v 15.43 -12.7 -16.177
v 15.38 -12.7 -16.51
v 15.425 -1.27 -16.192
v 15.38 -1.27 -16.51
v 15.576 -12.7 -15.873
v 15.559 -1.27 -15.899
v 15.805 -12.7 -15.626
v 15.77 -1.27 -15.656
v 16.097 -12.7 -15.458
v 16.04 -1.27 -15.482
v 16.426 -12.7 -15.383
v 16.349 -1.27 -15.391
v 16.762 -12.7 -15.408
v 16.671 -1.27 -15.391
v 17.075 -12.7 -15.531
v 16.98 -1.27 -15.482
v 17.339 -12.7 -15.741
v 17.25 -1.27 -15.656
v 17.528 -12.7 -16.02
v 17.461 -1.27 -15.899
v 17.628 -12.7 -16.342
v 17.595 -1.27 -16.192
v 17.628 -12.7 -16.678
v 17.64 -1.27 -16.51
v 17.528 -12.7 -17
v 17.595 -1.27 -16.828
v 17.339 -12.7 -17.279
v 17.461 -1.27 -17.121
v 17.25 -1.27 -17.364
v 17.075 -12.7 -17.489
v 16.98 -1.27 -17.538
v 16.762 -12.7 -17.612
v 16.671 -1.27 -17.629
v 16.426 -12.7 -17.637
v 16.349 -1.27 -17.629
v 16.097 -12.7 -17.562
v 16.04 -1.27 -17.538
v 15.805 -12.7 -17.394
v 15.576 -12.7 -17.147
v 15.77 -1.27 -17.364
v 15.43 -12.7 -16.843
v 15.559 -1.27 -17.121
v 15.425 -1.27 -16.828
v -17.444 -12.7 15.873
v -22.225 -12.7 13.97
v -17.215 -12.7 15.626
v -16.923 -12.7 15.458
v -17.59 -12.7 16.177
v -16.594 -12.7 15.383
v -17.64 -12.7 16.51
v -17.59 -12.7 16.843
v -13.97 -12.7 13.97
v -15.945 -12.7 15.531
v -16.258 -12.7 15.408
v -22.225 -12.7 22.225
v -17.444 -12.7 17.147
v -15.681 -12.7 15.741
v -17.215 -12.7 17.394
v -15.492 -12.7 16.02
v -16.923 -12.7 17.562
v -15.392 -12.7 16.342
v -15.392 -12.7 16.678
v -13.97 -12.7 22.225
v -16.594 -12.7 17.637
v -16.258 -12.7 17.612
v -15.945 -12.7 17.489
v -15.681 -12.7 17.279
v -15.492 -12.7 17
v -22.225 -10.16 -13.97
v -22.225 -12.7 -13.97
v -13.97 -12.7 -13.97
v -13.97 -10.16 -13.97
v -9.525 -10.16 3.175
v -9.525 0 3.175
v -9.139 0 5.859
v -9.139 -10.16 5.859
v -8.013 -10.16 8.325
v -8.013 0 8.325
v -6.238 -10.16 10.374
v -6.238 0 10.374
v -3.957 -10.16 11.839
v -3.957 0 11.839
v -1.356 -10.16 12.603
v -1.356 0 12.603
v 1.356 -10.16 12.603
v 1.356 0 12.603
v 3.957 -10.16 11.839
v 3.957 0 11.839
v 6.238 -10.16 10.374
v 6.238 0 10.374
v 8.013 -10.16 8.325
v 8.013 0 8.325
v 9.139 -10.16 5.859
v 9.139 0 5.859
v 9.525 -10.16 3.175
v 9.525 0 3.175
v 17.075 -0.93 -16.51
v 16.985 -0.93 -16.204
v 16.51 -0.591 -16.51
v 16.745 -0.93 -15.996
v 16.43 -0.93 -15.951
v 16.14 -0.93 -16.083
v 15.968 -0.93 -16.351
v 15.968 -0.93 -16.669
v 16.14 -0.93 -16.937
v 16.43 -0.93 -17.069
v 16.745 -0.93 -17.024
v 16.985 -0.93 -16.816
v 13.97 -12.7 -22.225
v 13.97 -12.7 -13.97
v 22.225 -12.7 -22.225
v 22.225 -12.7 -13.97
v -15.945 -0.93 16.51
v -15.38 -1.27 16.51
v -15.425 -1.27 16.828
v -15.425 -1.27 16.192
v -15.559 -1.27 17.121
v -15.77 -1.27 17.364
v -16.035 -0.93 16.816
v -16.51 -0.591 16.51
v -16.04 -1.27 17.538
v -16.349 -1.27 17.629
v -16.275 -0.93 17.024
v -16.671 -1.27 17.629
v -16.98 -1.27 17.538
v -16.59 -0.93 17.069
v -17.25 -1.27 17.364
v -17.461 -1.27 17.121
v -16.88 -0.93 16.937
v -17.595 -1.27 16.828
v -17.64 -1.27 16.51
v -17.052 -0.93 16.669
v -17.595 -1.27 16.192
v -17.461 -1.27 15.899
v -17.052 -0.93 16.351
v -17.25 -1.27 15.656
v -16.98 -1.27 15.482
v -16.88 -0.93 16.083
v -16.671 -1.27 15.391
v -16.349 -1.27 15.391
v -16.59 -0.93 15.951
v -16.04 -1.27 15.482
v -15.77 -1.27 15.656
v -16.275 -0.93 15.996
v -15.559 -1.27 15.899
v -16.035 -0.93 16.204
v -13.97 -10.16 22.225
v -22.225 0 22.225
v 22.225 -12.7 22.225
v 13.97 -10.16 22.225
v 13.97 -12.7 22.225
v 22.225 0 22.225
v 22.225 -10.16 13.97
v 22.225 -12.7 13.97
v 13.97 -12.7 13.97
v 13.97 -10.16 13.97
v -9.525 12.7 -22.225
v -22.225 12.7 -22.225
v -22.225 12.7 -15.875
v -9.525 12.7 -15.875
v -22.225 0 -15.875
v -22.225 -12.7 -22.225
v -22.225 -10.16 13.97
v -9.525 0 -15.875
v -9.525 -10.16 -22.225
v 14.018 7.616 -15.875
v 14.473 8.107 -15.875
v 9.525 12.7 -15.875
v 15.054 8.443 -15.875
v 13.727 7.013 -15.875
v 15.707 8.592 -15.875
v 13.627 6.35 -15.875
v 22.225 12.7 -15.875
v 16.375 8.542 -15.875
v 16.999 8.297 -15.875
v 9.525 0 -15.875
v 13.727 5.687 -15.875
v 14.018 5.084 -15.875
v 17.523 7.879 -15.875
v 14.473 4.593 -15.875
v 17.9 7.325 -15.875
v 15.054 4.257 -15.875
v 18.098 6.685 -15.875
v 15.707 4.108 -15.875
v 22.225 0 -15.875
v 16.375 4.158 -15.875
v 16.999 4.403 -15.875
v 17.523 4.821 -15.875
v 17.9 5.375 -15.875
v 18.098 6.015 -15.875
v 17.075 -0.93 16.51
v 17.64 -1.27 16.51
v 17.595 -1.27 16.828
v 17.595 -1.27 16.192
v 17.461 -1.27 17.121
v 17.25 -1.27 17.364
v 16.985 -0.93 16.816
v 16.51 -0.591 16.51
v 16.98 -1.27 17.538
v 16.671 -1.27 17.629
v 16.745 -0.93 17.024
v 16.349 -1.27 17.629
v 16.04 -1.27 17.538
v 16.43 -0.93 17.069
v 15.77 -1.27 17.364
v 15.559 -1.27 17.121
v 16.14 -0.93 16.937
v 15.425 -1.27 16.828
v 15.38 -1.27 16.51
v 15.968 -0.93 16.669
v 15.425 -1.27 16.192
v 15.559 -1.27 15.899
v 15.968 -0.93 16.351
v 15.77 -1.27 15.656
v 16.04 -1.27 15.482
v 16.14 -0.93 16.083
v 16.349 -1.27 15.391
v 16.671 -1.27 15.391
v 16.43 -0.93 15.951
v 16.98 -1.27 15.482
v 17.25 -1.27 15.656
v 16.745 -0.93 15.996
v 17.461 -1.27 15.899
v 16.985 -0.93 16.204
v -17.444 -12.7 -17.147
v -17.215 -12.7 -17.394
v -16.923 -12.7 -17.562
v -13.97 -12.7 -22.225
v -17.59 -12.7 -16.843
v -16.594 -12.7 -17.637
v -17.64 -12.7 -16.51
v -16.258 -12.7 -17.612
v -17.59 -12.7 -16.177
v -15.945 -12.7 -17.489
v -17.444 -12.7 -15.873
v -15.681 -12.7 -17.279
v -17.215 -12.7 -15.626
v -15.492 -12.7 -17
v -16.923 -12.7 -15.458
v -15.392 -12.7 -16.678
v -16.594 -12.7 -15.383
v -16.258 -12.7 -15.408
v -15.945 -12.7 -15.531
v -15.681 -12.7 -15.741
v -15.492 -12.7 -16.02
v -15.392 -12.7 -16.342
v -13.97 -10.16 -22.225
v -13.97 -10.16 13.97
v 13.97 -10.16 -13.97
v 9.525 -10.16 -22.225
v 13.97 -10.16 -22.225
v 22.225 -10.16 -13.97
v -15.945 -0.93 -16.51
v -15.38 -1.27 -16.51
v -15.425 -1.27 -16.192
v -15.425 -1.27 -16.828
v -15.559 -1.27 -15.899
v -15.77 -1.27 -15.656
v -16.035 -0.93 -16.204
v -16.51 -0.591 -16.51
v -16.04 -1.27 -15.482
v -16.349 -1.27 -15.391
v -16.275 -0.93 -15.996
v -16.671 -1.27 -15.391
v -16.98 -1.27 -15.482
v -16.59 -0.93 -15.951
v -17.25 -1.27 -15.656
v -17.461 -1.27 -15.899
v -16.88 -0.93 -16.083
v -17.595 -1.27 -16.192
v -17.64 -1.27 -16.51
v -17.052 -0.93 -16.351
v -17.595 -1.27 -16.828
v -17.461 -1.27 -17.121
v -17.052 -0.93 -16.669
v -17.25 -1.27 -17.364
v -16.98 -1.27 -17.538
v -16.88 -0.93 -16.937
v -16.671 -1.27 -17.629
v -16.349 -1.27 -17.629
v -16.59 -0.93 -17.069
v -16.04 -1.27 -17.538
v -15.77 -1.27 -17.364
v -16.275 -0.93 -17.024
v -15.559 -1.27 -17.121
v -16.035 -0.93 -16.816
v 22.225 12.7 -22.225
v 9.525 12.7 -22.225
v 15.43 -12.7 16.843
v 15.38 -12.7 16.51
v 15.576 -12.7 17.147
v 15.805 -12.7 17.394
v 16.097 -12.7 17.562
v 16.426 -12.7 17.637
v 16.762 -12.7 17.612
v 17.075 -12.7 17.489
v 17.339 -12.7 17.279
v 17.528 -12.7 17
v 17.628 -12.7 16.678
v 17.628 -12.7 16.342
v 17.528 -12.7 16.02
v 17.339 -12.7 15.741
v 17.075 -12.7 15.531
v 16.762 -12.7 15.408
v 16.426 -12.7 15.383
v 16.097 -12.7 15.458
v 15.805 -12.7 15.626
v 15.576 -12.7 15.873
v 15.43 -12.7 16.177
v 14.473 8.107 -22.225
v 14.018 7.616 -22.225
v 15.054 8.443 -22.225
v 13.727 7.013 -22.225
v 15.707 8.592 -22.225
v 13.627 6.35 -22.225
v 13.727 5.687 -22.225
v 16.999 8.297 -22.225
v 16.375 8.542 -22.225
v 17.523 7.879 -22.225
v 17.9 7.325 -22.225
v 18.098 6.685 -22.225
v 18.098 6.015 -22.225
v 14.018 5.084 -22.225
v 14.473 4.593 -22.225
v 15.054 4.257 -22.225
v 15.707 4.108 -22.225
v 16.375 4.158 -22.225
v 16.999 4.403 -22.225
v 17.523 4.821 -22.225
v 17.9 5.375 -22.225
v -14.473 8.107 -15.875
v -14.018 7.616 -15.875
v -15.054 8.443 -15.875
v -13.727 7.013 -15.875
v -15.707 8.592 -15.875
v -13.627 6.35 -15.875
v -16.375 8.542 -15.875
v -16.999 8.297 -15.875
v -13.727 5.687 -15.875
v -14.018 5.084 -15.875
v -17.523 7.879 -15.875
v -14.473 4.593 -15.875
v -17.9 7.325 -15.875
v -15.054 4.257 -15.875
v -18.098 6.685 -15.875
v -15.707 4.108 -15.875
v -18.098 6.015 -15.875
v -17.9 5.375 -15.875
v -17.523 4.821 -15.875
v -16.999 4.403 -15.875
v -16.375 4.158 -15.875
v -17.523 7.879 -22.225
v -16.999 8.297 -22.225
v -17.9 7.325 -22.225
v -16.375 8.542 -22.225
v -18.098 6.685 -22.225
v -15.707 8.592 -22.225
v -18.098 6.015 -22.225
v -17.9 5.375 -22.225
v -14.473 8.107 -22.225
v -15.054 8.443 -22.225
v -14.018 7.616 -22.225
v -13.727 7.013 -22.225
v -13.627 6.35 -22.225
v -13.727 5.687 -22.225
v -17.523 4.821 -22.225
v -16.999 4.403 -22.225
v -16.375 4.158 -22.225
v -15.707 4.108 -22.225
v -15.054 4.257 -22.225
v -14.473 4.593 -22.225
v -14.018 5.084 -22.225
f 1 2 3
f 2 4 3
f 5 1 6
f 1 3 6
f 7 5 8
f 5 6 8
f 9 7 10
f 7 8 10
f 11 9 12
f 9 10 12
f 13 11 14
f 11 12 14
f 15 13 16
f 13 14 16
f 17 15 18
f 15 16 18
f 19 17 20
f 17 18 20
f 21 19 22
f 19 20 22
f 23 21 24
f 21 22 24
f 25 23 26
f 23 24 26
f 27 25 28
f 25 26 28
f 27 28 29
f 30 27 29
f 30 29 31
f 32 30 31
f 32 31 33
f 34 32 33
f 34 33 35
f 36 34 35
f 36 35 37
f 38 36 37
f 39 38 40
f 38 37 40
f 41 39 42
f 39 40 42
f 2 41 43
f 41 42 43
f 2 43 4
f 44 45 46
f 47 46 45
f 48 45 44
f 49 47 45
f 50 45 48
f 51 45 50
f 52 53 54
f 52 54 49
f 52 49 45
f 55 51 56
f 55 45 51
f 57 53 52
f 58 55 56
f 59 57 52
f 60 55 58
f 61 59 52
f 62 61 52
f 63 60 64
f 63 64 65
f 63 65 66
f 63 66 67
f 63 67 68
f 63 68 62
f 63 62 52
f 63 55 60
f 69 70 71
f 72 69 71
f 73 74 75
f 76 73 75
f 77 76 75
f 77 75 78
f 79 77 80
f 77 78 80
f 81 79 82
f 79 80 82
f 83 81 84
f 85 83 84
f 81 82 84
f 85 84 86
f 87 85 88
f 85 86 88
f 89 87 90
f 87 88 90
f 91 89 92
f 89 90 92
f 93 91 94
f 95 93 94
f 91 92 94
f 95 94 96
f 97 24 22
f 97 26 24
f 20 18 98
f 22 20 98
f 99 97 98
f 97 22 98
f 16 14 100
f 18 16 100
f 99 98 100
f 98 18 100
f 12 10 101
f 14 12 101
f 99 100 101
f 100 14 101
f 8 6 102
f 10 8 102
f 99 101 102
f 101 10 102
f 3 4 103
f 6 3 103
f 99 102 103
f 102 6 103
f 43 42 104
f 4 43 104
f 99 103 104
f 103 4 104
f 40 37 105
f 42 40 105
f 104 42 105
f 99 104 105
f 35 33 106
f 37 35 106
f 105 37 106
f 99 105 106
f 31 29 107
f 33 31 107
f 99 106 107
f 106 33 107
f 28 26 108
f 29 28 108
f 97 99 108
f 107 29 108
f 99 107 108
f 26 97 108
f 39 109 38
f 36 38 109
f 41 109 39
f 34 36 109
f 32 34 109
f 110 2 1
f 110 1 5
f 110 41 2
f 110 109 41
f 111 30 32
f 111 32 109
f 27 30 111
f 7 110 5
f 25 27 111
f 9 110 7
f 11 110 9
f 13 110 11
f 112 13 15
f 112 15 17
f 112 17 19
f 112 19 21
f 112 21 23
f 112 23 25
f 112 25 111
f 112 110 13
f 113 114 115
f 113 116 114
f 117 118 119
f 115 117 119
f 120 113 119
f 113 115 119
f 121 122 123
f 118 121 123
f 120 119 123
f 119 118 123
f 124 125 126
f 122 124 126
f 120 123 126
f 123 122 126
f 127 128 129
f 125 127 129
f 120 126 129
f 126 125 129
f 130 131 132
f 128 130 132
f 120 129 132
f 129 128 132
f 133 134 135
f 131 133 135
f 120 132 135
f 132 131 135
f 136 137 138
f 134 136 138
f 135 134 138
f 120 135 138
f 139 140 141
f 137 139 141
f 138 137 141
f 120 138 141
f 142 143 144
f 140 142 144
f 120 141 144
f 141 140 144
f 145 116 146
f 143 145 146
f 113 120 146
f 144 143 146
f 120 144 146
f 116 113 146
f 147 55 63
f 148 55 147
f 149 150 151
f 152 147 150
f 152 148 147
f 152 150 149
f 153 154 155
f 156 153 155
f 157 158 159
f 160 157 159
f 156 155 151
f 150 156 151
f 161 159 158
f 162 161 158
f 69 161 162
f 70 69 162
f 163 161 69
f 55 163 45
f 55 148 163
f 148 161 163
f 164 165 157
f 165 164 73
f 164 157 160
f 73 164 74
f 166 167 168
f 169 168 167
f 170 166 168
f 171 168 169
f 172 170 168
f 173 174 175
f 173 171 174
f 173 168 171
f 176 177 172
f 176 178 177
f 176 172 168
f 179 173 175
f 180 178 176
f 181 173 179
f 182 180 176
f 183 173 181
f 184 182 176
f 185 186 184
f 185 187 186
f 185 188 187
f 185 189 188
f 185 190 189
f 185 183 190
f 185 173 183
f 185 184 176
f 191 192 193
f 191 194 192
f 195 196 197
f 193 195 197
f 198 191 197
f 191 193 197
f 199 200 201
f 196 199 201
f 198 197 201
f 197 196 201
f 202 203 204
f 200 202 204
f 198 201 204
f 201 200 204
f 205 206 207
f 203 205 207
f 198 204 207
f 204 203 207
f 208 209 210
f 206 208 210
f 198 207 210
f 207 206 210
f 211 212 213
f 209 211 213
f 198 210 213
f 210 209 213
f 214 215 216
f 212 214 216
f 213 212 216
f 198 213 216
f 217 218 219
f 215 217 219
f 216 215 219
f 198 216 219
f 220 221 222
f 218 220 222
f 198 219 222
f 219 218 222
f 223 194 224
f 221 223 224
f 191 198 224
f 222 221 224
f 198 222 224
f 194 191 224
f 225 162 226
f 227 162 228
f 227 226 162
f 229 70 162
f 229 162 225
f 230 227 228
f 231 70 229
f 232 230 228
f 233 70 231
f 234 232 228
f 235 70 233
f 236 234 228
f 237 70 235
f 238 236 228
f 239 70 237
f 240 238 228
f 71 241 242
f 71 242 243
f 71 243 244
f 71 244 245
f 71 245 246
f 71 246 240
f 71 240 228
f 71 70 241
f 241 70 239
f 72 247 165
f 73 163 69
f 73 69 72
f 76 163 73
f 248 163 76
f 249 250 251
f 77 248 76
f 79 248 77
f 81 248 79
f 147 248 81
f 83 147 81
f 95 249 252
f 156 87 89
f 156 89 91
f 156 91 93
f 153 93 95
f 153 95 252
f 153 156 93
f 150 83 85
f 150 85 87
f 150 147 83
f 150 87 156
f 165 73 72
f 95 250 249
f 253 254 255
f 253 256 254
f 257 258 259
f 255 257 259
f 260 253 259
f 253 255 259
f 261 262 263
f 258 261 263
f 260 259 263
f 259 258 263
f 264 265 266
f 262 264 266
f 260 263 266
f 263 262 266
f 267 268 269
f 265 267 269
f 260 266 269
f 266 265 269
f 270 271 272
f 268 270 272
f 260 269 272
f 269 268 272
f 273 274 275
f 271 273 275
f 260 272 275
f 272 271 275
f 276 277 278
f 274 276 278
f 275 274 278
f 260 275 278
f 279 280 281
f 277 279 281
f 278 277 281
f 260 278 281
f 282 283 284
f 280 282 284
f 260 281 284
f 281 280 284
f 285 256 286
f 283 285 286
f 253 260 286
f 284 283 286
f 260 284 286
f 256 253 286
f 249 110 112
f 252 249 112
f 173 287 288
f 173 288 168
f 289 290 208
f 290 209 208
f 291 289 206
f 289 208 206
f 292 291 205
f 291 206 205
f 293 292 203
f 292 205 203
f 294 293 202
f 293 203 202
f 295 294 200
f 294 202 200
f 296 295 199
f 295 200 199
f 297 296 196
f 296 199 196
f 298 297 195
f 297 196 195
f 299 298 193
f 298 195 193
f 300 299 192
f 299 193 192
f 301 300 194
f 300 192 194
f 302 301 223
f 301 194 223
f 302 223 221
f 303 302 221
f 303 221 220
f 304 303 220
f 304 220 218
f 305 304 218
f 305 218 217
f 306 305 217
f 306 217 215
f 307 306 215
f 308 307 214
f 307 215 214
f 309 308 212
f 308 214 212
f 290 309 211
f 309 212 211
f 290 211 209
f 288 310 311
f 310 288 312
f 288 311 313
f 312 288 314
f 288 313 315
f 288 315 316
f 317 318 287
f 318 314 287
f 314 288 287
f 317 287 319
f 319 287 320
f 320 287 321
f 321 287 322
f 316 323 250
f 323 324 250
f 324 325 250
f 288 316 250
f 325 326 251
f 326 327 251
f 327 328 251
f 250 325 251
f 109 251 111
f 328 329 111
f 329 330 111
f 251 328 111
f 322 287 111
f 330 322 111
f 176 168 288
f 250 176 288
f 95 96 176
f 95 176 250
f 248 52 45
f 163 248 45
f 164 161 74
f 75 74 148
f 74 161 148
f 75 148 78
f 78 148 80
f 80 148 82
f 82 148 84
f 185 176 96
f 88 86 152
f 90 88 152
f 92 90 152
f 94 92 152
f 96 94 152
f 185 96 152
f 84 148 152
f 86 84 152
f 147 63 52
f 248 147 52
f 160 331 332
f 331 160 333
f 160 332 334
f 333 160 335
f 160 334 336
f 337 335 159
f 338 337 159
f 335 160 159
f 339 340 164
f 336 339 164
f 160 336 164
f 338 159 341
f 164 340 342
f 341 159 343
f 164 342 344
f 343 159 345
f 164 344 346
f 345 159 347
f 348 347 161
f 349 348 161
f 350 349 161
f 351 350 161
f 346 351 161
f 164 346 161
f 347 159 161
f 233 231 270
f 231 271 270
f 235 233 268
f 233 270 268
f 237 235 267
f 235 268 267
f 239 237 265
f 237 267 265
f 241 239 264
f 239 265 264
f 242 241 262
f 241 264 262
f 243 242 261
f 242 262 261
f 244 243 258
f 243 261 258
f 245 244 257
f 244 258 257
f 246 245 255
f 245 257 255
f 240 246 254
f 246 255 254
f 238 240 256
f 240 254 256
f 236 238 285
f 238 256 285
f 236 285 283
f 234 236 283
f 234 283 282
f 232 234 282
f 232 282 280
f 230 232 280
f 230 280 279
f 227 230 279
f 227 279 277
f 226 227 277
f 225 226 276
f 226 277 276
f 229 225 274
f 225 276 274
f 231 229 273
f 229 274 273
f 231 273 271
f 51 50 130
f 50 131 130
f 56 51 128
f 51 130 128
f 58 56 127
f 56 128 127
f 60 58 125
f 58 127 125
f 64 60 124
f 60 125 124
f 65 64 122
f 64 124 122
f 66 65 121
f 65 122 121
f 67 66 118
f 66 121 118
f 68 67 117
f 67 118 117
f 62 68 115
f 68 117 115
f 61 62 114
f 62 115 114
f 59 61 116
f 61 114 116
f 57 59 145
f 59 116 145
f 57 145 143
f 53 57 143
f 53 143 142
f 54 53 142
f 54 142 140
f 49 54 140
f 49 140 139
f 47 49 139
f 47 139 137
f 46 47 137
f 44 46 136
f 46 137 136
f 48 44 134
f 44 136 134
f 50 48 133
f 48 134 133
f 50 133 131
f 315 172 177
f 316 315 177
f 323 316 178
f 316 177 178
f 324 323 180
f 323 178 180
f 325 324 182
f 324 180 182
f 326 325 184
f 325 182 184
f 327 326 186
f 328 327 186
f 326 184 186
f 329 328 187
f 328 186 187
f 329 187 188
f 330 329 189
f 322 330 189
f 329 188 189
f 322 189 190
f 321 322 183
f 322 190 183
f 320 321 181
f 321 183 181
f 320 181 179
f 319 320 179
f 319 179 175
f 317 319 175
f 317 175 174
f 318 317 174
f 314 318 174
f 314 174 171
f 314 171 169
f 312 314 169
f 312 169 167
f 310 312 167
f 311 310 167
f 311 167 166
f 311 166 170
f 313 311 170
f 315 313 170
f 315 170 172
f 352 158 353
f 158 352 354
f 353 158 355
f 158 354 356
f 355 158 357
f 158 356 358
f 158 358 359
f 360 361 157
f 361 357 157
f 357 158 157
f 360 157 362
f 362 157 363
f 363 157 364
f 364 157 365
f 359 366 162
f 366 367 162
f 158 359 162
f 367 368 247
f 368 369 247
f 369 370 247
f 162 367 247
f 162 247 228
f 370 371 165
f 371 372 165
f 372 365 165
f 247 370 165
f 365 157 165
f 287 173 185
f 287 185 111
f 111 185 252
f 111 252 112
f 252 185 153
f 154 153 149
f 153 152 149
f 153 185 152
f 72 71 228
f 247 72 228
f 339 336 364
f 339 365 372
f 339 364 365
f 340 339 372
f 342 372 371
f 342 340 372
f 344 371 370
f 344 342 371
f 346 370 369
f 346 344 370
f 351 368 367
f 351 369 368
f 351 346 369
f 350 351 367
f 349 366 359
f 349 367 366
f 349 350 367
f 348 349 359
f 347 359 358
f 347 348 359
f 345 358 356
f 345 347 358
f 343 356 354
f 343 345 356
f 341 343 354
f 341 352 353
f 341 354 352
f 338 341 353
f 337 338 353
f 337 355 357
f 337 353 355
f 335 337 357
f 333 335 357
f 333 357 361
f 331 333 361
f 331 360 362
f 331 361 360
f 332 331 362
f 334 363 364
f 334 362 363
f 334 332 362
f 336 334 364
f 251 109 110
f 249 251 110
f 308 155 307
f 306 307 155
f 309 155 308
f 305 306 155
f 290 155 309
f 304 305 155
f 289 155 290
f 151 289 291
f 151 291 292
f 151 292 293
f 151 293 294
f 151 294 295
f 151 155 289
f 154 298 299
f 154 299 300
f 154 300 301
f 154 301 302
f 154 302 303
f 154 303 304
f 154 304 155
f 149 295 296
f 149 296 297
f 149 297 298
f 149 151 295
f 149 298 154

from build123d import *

# Parameters (mm, degrees)
F0_W     = 44.45
F0_H     = 44.45
F1_DEPTH = 12.7
F2_W     = 12.7
F2_H     = 6.35
F3_DEPTH = 12.7
F5_DEPTH = 2.54
F6_D     = 2.2606
F6_DEPTH = 11.43
F6_TIP   = 0.6791527577
F9_DEPTH = 12.701
F10_D    = 4.4958


# Not quite as in the source:
# - a pattern or mirror of a feature is missing from the dataset's text; its kind, count and spacing are read off the source's solid


with BuildPart() as f1:
    # F0 (on Front) → F1 (new body)
    with BuildSketch(Plane.XZ):
        Rectangle(F0_W, F0_H)
    extrude(amount=F1_DEPTH)

    # F2 (on face) → F3 (join)
    with BuildSketch(Plane(origin=(-22.225, 0, 0), x_dir=(0, -1, 0), z_dir=(-1, 0, 0))):
        with Locations((-6.35, -19.05)):
            Rectangle(F2_W, F2_H)
    f3 = extrude(amount=-F3_DEPTH)

    # F3_copies: F3 across plane
    add(f3.mirror(Plane(origin=(0, 0, 0), x_dir=(0, 0, 1), z_dir=(1, 0, 0))))

    # F4 (on face) → F5 (cut)
    with BuildSketch(Plane.XZ.offset(12.7)):
        Polygon((-13.97, 13.97), (-22.225, 13.97), (-22.225, 0), (-22.225, -13.97), (-13.97, -13.97), (-13.97, -22.225), (0, -22.225), (13.97, -22.225), (13.97, -13.97), (22.225, -13.97), (22.225, 0), (22.225, 13.97), (13.97, 13.97), (13.97, 22.225), (0, 22.225), (-13.97, 22.225), align=None)
    extrude(amount=-F5_DEPTH, mode=Mode.SUBTRACT)

    # F6
    with Locations(Plane.XZ.offset(12.7)):
        with Locations((-16.51, 16.51), (16.51, 16.51), (16.51, -16.51), (-16.51, -16.51)):
            Hole(F6_D / 2, depth=F6_DEPTH)
            with Locations((0, 0, -(F6_DEPTH + F6_TIP / 2))):  # 118° drill point
                Cone(0, F6_D / 2, F6_TIP, mode=Mode.SUBTRACT)

    # F8 (on face) → F9 (cut, through all)
    with BuildSketch(Plane(origin=(0, 0, 0), x_dir=(-1, 0, 0), z_dir=(0, 1, 0))):
        with BuildLine():
            Line((-9.525, 3.175), (-9.525, -22.225))
            Line((-9.525, -22.225), (9.525, -22.225))
            Line((9.525, -22.225), (9.525, 3.175))
            ThreePointArc((9.525, 3.175), (0, 12.7), (-9.525, 3.175))
        make_face()
    extrude(amount=-F9_DEPTH, mode=Mode.SUBTRACT)

    # F10 (through all)
    with Locations(Plane(origin=(0, 0, -22.225), x_dir=(1, 0, 0), z_dir=(0, 0, -1))):
        with Locations((15.875, -6.35)):
            f10 = Hole(F10_D / 2)

    # F10_copies: F10 across plane
    add(f10.mirror(Plane(origin=(0, 0, 0), x_dir=(0, 0, -1), z_dir=(-1, 0, 0))), mode=Mode.SUBTRACT)


solid = f1.part
